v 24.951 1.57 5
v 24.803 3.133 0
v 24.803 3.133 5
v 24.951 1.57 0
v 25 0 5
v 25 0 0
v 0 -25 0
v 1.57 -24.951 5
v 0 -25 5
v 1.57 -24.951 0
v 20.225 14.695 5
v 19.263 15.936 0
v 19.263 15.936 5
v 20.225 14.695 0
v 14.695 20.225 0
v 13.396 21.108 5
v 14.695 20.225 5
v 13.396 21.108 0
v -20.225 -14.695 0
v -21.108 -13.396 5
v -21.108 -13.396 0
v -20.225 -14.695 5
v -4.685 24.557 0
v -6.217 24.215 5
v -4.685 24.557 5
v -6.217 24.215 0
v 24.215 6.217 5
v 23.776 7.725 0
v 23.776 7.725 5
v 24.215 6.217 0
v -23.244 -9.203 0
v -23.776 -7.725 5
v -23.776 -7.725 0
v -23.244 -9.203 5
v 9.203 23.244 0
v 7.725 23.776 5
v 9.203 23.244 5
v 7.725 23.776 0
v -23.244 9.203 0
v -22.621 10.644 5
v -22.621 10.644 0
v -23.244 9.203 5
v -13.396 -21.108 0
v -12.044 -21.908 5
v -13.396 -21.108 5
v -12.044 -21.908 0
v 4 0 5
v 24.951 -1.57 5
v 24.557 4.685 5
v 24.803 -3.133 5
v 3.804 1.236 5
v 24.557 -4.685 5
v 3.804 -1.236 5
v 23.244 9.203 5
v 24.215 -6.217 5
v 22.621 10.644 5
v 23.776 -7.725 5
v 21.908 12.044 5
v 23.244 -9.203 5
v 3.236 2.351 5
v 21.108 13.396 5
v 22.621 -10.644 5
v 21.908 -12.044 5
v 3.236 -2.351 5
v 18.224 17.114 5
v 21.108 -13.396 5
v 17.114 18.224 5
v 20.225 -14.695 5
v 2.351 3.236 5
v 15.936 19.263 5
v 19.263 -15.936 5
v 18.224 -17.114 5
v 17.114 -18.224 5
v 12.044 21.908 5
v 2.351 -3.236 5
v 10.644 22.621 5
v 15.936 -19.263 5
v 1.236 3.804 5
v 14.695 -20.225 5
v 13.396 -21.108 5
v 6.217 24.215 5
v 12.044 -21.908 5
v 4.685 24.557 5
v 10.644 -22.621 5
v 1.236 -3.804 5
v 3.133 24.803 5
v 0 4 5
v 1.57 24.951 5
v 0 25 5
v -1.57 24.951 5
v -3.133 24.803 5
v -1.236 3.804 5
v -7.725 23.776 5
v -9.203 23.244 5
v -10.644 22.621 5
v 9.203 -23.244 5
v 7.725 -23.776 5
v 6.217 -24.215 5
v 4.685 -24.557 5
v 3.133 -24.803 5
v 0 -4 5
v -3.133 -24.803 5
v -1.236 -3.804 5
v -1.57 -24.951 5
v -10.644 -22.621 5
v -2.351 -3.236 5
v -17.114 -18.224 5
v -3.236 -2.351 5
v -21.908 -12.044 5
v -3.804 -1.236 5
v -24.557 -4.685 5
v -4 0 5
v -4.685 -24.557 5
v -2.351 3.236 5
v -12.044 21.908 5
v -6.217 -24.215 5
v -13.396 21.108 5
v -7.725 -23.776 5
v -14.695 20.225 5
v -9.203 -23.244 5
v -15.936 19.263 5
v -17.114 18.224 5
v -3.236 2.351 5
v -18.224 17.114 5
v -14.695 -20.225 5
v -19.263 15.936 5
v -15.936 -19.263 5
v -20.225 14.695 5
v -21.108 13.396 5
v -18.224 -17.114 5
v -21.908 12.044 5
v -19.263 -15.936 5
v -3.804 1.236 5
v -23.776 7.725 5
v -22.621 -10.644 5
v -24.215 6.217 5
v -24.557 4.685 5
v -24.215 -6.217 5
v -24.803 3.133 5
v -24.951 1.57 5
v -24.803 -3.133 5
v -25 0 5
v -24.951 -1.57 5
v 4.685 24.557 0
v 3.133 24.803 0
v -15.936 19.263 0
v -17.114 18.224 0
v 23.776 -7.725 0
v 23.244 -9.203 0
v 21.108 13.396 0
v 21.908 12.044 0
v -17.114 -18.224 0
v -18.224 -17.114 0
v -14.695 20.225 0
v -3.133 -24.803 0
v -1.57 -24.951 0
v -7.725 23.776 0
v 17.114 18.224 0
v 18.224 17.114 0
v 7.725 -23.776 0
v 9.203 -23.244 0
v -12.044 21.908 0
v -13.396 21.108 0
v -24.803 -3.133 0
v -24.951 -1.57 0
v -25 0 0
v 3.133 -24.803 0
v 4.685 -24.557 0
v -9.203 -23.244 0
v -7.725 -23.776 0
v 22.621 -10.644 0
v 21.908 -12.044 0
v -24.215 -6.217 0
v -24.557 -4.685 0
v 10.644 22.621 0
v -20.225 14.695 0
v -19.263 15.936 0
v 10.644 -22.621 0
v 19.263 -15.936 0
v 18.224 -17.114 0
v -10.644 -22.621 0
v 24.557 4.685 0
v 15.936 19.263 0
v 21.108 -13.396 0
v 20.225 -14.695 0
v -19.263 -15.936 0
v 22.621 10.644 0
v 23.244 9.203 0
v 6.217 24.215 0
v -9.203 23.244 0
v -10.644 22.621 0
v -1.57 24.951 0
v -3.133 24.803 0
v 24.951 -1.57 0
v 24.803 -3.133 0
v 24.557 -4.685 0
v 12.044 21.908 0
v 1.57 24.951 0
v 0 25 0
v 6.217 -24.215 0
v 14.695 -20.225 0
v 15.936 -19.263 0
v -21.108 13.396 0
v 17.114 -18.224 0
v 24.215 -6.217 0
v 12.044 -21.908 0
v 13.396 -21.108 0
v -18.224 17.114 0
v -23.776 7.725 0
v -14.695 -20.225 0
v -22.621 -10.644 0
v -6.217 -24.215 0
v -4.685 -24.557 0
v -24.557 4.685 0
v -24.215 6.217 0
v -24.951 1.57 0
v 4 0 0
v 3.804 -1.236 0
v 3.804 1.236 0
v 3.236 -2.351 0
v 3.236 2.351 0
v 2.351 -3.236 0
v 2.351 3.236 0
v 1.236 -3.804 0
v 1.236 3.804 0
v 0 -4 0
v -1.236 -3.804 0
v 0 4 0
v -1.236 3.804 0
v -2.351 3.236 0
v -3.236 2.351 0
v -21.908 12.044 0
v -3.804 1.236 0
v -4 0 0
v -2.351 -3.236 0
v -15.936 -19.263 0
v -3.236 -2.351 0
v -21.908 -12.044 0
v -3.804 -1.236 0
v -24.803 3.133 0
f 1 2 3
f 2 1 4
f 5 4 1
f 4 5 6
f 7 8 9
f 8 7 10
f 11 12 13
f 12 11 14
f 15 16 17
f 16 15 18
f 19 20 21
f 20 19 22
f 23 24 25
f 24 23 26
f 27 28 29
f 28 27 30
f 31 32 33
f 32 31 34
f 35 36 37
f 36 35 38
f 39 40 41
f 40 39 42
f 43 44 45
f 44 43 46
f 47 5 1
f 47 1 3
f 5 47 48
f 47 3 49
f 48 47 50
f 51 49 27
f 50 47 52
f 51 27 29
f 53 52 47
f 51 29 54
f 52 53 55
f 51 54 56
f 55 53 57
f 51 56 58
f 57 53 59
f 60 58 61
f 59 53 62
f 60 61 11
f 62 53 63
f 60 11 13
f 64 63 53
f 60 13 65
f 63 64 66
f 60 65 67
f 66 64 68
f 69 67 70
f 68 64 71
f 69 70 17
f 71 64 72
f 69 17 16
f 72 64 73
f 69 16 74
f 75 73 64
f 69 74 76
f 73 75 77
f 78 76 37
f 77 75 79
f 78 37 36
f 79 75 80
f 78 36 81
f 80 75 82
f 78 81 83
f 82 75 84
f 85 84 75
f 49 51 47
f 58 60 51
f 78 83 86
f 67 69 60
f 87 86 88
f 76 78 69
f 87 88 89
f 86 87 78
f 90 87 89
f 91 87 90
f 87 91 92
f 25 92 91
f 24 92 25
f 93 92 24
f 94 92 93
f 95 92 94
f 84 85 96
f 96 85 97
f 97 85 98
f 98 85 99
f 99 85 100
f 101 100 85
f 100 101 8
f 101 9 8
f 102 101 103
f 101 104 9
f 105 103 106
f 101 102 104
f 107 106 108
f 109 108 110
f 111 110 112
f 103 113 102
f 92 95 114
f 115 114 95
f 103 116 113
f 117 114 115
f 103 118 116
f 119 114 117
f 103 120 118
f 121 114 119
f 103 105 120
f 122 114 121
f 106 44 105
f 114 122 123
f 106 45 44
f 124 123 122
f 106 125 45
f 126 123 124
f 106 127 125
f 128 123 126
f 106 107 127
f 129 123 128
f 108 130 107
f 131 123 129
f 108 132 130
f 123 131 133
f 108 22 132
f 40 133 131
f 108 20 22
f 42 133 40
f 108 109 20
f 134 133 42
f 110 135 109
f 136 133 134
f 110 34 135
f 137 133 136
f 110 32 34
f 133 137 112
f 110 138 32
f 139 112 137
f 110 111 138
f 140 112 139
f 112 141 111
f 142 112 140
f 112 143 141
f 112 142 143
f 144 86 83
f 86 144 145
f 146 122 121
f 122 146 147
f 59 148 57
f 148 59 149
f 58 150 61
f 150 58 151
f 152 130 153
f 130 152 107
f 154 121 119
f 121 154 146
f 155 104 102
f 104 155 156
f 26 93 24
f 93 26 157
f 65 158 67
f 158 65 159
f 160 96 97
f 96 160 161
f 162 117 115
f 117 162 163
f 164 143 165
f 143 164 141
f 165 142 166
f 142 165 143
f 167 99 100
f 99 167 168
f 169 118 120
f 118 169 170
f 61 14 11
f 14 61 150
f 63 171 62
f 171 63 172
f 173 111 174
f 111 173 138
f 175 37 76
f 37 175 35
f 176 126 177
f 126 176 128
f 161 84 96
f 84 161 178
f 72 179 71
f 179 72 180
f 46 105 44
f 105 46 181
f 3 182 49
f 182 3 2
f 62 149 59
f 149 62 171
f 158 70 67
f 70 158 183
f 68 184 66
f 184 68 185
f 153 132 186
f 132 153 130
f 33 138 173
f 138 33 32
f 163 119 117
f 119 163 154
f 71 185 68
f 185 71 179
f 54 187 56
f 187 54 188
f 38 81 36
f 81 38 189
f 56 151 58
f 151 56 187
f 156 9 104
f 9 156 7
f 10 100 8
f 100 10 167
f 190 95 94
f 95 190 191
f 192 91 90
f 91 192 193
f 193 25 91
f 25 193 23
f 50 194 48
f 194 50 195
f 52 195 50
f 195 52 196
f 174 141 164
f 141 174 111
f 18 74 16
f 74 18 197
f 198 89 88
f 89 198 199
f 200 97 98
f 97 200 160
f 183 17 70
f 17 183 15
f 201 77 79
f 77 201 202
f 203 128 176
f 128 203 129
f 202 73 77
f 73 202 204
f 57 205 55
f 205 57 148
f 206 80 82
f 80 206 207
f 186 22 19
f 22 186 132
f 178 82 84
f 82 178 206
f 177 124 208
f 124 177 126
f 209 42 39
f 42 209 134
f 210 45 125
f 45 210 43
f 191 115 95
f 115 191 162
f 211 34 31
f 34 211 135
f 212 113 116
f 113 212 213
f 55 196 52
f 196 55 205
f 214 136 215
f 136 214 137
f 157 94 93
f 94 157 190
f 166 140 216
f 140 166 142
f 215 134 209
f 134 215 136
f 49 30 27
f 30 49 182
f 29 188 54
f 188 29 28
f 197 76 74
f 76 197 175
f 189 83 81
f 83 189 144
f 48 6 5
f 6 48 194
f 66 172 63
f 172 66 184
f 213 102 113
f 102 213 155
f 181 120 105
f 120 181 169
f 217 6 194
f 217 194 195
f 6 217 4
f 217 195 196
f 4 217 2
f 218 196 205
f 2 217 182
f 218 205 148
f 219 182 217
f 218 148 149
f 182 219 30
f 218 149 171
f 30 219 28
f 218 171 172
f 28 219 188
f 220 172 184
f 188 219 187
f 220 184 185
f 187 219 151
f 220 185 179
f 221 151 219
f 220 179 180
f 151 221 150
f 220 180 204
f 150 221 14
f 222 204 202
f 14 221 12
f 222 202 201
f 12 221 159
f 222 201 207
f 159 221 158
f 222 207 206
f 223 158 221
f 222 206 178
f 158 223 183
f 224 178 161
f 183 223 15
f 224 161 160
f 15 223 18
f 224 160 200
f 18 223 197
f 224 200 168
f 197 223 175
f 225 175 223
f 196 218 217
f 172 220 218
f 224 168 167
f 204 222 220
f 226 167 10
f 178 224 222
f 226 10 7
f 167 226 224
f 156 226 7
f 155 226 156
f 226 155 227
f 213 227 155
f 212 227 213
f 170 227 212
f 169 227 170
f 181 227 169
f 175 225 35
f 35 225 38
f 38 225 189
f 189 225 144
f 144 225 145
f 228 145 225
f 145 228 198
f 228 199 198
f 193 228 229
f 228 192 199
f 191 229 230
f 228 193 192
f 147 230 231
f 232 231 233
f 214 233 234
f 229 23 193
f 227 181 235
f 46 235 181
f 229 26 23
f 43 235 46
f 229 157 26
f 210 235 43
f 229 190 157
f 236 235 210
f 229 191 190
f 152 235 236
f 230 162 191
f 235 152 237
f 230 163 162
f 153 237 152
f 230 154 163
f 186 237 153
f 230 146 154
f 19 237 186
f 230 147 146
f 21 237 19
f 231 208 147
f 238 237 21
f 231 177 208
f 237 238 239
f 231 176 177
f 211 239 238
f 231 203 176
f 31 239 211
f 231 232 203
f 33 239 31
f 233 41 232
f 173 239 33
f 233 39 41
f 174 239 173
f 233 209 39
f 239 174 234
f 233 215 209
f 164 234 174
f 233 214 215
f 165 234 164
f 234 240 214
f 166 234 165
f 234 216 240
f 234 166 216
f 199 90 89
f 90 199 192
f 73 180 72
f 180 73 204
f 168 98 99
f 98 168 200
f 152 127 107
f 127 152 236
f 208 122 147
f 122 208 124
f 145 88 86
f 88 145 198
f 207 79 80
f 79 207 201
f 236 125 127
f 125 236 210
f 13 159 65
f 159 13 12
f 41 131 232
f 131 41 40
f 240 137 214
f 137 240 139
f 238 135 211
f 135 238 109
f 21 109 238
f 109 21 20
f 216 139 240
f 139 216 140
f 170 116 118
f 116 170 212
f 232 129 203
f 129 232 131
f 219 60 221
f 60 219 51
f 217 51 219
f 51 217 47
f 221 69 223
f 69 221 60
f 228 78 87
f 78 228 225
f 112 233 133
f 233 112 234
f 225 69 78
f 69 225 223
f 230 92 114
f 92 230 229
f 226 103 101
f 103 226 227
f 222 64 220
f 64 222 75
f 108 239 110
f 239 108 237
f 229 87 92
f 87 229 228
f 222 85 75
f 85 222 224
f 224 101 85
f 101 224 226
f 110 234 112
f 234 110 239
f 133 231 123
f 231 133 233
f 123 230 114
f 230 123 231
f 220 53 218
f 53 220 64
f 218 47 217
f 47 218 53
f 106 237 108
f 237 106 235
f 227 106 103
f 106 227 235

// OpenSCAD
// file: utils/build_plate.scad
// Build Plate representation module
// Made by Makerbot (http://curriculum.makerbot.com/daily_lessons/february/openscad_buildplate.html)

//use this to include a build plate visualization in your openSCAD scripts. Very useful for things designed to be edited in Makerbot Customizer

//to use, either include or use <utils/build_plate.scad>

//then just call build_plate(); with the following arguments (also, you have to have a real object in your scene for this to render)

//putting 0 as the first argument will give you a Replicator 2 build plate
//putting 1 as the first argument will give you a Replicator 1 build plate
//putting 2 as the first argument will give you a Thingomatic build plate
//putting 3 as the first argument will give you a manually adjustable build plate (note: if you use this option, you need to specify your build plates X length (in mm) as the second argument and the Y length (in mm) as the third argument. eg. build_plate(3,150,120);)

/*

to give your user control of which build plate they see in Customizer, include the following code:

use <utils/build_plate.scad>

//for display only, doesn't contribute to final object
build_plate_selector = 0; //[0:Replicator 2,1: Replicator,2:Thingomatic,3:Manual]
//when Build Plate Selector is set to "manual" this controls the build plate x dimension
build_plate_manual_x = 100; //[100:400]
//when Build Plate Selector is set to "manual" this controls the build plate y dimension
build_plate_manual_y = 100; //[100:400]

build_plate(build_plate_selector,build_plate_manual_x,build_plate_manual_y);

*/




//to see how this works, uncomment the following code

//build_plate_selector = 0; //[0:Replicator 2,1: Replicator,2:Thingomatic,3:Manual]
//build_plate_manual_x = 100; //[100:400]
//build_plate_manual_y = 100; //[100:400]
//
//build_plate(build_plate_selector,build_plate_manual_x,build_plate_manual_y);
//
//cube(5);


module build_plate(bp,manX,manY){

		translate([0,0,-.52]){
			if(bp == 0){
				%cube([285,153,1],center = true);
			}
			if(bp == 1){
				%cube([225,145,1],center = true);
			}
			if(bp == 2){
				%cube([120,120,1],center = true);
			}
			if(bp == 3){
				%cube([manX,manY,1],center = true);
			}
		
		}
		translate([0,0,-.5]){
			if(bp == 0){
				for(i = [-14:14]){
					translate([i*10,0,0])
					%cube([.5,153,1.01],center = true);
				}
				for(i = [-7:7]){
					translate([0,i*10,0])
					%cube([285,.5,1.01],center = true);
				}	
			}
			if(bp == 1){
				for(i = [-11:11]){
					translate([i*10,0,0])
						%cube([.5,145,1.01],center = true);
				}
				for(i = [-7:7]){
					translate([0,i*10,0])
						%cube([225,.5,1.01],center = true);
				}
			}
			if(bp == 2){
				for(i = [-6:6]){
					translate([i*10,0,0])
						%cube([.5,120,1.01],center = true);
				}
				for(i = [-6:6]){
					translate([0,i*10,0])
						%cube([120,.5,1.01],center = true);
				}
			}
			if(bp == 3){
				for(i = [-(floor(manX/20)):floor(manX/20)]){
					translate([i*10,0,0])
						%cube([.5,manY,1.01],center = true);
				}
				for(i = [-(floor(manY/20)):floor(manY/20)]){
					translate([0,i*10,0])
						%cube([manX,.5,1.01],center = true);
				}
			}
		}
}
// main file
use <./utils/build_plate.scad> // Cuadricula transparente para la base
build_plate(3, 200,100); // No se incluye al renderizar


//----------------------------------------------------------
//-- Tutorial OpenScad
//-- Juan Gonzalez-Gomez (Obijuan) juan@iearobotics.com
//----------------------------------------------------------
//-- (c) Mayo, 2012
//-- Licencia GPL
//----------------------------------------------------------
//-- Rueda parametrizada
//----------------------------------------------------------

//-- Parámetros de la rueda
grosor = 5;
diametro=50;
diam_eje = 8;


//-- Construcción de la rueda a partir de
//-- los parámetros
difference() {
  //-- Base de la rueda
  cylinder(r=diametro/2, h=grosor,$fn=100);

  //-- Taladro del eje
  cylinder(r=diam_eje/2, h=3*grosor,$fn=20,center=true);
}
